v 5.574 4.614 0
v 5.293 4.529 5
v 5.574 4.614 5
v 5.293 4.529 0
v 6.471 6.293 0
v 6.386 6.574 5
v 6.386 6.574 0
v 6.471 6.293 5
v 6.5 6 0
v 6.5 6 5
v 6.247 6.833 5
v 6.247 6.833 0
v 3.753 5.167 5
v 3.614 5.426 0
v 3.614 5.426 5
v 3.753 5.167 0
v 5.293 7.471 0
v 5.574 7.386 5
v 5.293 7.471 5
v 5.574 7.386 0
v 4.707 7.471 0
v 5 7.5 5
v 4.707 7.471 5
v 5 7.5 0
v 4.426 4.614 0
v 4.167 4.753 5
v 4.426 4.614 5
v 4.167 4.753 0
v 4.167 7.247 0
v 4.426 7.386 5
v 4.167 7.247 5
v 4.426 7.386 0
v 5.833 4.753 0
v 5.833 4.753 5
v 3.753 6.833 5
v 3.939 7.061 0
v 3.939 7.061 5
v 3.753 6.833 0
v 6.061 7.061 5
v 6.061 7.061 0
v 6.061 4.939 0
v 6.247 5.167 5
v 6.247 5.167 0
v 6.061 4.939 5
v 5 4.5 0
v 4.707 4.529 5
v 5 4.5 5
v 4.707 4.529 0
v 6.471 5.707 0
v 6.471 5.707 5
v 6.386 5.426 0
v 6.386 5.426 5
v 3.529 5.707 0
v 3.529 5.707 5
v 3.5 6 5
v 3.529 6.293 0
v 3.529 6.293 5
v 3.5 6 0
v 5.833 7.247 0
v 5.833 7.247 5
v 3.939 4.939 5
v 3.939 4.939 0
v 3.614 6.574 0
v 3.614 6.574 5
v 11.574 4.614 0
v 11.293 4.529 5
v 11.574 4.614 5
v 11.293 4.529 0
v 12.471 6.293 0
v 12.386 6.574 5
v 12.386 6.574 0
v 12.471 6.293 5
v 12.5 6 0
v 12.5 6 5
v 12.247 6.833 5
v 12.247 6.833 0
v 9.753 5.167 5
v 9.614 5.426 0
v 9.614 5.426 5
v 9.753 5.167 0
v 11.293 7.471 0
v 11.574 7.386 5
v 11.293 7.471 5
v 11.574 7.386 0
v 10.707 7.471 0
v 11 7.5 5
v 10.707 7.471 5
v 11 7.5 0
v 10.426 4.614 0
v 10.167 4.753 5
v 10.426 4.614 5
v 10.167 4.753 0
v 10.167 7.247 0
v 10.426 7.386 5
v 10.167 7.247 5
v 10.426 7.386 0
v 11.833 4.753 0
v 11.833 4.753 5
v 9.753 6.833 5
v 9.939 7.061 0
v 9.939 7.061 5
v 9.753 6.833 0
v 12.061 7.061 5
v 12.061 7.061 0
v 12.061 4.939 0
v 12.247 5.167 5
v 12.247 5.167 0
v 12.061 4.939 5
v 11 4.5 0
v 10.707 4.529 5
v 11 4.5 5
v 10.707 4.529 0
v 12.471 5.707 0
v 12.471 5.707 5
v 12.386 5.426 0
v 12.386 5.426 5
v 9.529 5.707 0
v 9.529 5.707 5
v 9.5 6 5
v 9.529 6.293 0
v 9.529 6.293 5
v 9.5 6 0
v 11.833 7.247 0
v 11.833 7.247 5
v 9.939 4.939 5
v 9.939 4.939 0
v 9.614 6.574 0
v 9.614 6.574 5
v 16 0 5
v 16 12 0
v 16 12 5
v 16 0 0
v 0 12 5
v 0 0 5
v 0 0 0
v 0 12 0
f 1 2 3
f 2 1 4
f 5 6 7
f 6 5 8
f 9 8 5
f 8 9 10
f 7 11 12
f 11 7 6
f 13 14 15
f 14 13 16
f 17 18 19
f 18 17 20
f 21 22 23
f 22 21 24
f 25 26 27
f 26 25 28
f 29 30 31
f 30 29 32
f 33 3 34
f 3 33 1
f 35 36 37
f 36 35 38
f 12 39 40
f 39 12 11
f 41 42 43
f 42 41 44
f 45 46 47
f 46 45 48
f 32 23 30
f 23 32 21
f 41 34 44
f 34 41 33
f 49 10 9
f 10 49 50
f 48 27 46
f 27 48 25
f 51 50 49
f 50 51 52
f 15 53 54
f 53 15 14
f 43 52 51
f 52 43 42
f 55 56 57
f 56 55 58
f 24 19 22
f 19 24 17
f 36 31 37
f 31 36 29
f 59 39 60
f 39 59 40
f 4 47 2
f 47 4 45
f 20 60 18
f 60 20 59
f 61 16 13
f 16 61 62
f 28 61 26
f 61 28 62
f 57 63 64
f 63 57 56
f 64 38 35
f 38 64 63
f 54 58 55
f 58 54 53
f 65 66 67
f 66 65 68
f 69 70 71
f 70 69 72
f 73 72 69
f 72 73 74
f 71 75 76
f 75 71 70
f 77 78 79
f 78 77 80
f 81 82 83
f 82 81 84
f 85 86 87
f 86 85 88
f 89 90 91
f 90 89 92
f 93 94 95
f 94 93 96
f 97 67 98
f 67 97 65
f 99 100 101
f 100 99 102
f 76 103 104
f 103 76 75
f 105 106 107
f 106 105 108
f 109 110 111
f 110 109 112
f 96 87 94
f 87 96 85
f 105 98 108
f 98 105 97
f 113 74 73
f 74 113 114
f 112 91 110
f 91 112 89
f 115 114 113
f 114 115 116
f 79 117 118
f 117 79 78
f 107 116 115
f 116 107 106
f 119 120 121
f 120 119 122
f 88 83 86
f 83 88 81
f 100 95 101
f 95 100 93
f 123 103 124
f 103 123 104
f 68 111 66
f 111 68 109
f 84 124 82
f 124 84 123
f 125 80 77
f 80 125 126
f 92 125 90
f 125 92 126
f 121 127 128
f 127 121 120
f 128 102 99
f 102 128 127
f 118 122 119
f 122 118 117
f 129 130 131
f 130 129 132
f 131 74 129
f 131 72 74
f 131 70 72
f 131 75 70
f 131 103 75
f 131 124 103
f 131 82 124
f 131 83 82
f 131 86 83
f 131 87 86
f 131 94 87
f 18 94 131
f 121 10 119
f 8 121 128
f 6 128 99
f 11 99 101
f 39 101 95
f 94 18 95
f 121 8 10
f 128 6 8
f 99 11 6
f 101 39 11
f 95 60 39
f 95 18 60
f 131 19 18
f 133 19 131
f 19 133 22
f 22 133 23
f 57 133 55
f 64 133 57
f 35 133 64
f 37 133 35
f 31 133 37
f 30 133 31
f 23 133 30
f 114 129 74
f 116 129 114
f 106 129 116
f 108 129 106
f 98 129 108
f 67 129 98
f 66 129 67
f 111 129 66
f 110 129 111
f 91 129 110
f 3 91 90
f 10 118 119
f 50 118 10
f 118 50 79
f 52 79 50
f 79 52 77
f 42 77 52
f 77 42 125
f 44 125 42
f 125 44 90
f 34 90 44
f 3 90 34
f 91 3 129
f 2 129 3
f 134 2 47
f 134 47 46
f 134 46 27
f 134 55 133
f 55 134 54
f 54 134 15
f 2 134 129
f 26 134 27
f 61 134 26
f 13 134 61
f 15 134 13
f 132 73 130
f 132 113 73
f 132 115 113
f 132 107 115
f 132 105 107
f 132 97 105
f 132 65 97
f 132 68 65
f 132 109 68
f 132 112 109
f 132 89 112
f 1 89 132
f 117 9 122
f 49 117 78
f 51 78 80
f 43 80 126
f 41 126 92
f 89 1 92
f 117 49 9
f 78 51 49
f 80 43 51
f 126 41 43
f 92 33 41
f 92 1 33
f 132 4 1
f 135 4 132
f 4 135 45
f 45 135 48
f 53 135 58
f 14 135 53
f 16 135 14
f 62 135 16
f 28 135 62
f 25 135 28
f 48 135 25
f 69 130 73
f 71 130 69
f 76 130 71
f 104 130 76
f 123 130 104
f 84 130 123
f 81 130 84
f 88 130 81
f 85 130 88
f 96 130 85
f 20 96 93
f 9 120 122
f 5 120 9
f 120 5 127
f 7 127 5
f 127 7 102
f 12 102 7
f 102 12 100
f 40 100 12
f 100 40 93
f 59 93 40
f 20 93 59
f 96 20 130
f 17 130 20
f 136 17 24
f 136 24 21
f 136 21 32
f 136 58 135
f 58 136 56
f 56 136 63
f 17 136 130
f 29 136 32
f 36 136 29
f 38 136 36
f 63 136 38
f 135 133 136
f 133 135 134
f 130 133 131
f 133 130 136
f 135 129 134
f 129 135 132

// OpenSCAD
$fn = 32;

// ----------------------------------------------------------------------
// Micro pad: two-hole pad, 5-20 mm class
// ----------------------------------------------------------------------

// --- parameters (mm) ---
pad_l = 16;               // pad length, X
pad_w = 12;               // pad width, Y
pad_t = 5;                // pad thickness, Z
hole_d = 3;               // hole diameter
hole_x = 5;               // X of the first hole centre

difference() {
  cube([pad_l, pad_w, pad_t]);
  for (x = [hole_x, pad_l - hole_x])
    translate([x, pad_w / 2, -1])
      cylinder(h = pad_t + 2, d = hole_d);
}
